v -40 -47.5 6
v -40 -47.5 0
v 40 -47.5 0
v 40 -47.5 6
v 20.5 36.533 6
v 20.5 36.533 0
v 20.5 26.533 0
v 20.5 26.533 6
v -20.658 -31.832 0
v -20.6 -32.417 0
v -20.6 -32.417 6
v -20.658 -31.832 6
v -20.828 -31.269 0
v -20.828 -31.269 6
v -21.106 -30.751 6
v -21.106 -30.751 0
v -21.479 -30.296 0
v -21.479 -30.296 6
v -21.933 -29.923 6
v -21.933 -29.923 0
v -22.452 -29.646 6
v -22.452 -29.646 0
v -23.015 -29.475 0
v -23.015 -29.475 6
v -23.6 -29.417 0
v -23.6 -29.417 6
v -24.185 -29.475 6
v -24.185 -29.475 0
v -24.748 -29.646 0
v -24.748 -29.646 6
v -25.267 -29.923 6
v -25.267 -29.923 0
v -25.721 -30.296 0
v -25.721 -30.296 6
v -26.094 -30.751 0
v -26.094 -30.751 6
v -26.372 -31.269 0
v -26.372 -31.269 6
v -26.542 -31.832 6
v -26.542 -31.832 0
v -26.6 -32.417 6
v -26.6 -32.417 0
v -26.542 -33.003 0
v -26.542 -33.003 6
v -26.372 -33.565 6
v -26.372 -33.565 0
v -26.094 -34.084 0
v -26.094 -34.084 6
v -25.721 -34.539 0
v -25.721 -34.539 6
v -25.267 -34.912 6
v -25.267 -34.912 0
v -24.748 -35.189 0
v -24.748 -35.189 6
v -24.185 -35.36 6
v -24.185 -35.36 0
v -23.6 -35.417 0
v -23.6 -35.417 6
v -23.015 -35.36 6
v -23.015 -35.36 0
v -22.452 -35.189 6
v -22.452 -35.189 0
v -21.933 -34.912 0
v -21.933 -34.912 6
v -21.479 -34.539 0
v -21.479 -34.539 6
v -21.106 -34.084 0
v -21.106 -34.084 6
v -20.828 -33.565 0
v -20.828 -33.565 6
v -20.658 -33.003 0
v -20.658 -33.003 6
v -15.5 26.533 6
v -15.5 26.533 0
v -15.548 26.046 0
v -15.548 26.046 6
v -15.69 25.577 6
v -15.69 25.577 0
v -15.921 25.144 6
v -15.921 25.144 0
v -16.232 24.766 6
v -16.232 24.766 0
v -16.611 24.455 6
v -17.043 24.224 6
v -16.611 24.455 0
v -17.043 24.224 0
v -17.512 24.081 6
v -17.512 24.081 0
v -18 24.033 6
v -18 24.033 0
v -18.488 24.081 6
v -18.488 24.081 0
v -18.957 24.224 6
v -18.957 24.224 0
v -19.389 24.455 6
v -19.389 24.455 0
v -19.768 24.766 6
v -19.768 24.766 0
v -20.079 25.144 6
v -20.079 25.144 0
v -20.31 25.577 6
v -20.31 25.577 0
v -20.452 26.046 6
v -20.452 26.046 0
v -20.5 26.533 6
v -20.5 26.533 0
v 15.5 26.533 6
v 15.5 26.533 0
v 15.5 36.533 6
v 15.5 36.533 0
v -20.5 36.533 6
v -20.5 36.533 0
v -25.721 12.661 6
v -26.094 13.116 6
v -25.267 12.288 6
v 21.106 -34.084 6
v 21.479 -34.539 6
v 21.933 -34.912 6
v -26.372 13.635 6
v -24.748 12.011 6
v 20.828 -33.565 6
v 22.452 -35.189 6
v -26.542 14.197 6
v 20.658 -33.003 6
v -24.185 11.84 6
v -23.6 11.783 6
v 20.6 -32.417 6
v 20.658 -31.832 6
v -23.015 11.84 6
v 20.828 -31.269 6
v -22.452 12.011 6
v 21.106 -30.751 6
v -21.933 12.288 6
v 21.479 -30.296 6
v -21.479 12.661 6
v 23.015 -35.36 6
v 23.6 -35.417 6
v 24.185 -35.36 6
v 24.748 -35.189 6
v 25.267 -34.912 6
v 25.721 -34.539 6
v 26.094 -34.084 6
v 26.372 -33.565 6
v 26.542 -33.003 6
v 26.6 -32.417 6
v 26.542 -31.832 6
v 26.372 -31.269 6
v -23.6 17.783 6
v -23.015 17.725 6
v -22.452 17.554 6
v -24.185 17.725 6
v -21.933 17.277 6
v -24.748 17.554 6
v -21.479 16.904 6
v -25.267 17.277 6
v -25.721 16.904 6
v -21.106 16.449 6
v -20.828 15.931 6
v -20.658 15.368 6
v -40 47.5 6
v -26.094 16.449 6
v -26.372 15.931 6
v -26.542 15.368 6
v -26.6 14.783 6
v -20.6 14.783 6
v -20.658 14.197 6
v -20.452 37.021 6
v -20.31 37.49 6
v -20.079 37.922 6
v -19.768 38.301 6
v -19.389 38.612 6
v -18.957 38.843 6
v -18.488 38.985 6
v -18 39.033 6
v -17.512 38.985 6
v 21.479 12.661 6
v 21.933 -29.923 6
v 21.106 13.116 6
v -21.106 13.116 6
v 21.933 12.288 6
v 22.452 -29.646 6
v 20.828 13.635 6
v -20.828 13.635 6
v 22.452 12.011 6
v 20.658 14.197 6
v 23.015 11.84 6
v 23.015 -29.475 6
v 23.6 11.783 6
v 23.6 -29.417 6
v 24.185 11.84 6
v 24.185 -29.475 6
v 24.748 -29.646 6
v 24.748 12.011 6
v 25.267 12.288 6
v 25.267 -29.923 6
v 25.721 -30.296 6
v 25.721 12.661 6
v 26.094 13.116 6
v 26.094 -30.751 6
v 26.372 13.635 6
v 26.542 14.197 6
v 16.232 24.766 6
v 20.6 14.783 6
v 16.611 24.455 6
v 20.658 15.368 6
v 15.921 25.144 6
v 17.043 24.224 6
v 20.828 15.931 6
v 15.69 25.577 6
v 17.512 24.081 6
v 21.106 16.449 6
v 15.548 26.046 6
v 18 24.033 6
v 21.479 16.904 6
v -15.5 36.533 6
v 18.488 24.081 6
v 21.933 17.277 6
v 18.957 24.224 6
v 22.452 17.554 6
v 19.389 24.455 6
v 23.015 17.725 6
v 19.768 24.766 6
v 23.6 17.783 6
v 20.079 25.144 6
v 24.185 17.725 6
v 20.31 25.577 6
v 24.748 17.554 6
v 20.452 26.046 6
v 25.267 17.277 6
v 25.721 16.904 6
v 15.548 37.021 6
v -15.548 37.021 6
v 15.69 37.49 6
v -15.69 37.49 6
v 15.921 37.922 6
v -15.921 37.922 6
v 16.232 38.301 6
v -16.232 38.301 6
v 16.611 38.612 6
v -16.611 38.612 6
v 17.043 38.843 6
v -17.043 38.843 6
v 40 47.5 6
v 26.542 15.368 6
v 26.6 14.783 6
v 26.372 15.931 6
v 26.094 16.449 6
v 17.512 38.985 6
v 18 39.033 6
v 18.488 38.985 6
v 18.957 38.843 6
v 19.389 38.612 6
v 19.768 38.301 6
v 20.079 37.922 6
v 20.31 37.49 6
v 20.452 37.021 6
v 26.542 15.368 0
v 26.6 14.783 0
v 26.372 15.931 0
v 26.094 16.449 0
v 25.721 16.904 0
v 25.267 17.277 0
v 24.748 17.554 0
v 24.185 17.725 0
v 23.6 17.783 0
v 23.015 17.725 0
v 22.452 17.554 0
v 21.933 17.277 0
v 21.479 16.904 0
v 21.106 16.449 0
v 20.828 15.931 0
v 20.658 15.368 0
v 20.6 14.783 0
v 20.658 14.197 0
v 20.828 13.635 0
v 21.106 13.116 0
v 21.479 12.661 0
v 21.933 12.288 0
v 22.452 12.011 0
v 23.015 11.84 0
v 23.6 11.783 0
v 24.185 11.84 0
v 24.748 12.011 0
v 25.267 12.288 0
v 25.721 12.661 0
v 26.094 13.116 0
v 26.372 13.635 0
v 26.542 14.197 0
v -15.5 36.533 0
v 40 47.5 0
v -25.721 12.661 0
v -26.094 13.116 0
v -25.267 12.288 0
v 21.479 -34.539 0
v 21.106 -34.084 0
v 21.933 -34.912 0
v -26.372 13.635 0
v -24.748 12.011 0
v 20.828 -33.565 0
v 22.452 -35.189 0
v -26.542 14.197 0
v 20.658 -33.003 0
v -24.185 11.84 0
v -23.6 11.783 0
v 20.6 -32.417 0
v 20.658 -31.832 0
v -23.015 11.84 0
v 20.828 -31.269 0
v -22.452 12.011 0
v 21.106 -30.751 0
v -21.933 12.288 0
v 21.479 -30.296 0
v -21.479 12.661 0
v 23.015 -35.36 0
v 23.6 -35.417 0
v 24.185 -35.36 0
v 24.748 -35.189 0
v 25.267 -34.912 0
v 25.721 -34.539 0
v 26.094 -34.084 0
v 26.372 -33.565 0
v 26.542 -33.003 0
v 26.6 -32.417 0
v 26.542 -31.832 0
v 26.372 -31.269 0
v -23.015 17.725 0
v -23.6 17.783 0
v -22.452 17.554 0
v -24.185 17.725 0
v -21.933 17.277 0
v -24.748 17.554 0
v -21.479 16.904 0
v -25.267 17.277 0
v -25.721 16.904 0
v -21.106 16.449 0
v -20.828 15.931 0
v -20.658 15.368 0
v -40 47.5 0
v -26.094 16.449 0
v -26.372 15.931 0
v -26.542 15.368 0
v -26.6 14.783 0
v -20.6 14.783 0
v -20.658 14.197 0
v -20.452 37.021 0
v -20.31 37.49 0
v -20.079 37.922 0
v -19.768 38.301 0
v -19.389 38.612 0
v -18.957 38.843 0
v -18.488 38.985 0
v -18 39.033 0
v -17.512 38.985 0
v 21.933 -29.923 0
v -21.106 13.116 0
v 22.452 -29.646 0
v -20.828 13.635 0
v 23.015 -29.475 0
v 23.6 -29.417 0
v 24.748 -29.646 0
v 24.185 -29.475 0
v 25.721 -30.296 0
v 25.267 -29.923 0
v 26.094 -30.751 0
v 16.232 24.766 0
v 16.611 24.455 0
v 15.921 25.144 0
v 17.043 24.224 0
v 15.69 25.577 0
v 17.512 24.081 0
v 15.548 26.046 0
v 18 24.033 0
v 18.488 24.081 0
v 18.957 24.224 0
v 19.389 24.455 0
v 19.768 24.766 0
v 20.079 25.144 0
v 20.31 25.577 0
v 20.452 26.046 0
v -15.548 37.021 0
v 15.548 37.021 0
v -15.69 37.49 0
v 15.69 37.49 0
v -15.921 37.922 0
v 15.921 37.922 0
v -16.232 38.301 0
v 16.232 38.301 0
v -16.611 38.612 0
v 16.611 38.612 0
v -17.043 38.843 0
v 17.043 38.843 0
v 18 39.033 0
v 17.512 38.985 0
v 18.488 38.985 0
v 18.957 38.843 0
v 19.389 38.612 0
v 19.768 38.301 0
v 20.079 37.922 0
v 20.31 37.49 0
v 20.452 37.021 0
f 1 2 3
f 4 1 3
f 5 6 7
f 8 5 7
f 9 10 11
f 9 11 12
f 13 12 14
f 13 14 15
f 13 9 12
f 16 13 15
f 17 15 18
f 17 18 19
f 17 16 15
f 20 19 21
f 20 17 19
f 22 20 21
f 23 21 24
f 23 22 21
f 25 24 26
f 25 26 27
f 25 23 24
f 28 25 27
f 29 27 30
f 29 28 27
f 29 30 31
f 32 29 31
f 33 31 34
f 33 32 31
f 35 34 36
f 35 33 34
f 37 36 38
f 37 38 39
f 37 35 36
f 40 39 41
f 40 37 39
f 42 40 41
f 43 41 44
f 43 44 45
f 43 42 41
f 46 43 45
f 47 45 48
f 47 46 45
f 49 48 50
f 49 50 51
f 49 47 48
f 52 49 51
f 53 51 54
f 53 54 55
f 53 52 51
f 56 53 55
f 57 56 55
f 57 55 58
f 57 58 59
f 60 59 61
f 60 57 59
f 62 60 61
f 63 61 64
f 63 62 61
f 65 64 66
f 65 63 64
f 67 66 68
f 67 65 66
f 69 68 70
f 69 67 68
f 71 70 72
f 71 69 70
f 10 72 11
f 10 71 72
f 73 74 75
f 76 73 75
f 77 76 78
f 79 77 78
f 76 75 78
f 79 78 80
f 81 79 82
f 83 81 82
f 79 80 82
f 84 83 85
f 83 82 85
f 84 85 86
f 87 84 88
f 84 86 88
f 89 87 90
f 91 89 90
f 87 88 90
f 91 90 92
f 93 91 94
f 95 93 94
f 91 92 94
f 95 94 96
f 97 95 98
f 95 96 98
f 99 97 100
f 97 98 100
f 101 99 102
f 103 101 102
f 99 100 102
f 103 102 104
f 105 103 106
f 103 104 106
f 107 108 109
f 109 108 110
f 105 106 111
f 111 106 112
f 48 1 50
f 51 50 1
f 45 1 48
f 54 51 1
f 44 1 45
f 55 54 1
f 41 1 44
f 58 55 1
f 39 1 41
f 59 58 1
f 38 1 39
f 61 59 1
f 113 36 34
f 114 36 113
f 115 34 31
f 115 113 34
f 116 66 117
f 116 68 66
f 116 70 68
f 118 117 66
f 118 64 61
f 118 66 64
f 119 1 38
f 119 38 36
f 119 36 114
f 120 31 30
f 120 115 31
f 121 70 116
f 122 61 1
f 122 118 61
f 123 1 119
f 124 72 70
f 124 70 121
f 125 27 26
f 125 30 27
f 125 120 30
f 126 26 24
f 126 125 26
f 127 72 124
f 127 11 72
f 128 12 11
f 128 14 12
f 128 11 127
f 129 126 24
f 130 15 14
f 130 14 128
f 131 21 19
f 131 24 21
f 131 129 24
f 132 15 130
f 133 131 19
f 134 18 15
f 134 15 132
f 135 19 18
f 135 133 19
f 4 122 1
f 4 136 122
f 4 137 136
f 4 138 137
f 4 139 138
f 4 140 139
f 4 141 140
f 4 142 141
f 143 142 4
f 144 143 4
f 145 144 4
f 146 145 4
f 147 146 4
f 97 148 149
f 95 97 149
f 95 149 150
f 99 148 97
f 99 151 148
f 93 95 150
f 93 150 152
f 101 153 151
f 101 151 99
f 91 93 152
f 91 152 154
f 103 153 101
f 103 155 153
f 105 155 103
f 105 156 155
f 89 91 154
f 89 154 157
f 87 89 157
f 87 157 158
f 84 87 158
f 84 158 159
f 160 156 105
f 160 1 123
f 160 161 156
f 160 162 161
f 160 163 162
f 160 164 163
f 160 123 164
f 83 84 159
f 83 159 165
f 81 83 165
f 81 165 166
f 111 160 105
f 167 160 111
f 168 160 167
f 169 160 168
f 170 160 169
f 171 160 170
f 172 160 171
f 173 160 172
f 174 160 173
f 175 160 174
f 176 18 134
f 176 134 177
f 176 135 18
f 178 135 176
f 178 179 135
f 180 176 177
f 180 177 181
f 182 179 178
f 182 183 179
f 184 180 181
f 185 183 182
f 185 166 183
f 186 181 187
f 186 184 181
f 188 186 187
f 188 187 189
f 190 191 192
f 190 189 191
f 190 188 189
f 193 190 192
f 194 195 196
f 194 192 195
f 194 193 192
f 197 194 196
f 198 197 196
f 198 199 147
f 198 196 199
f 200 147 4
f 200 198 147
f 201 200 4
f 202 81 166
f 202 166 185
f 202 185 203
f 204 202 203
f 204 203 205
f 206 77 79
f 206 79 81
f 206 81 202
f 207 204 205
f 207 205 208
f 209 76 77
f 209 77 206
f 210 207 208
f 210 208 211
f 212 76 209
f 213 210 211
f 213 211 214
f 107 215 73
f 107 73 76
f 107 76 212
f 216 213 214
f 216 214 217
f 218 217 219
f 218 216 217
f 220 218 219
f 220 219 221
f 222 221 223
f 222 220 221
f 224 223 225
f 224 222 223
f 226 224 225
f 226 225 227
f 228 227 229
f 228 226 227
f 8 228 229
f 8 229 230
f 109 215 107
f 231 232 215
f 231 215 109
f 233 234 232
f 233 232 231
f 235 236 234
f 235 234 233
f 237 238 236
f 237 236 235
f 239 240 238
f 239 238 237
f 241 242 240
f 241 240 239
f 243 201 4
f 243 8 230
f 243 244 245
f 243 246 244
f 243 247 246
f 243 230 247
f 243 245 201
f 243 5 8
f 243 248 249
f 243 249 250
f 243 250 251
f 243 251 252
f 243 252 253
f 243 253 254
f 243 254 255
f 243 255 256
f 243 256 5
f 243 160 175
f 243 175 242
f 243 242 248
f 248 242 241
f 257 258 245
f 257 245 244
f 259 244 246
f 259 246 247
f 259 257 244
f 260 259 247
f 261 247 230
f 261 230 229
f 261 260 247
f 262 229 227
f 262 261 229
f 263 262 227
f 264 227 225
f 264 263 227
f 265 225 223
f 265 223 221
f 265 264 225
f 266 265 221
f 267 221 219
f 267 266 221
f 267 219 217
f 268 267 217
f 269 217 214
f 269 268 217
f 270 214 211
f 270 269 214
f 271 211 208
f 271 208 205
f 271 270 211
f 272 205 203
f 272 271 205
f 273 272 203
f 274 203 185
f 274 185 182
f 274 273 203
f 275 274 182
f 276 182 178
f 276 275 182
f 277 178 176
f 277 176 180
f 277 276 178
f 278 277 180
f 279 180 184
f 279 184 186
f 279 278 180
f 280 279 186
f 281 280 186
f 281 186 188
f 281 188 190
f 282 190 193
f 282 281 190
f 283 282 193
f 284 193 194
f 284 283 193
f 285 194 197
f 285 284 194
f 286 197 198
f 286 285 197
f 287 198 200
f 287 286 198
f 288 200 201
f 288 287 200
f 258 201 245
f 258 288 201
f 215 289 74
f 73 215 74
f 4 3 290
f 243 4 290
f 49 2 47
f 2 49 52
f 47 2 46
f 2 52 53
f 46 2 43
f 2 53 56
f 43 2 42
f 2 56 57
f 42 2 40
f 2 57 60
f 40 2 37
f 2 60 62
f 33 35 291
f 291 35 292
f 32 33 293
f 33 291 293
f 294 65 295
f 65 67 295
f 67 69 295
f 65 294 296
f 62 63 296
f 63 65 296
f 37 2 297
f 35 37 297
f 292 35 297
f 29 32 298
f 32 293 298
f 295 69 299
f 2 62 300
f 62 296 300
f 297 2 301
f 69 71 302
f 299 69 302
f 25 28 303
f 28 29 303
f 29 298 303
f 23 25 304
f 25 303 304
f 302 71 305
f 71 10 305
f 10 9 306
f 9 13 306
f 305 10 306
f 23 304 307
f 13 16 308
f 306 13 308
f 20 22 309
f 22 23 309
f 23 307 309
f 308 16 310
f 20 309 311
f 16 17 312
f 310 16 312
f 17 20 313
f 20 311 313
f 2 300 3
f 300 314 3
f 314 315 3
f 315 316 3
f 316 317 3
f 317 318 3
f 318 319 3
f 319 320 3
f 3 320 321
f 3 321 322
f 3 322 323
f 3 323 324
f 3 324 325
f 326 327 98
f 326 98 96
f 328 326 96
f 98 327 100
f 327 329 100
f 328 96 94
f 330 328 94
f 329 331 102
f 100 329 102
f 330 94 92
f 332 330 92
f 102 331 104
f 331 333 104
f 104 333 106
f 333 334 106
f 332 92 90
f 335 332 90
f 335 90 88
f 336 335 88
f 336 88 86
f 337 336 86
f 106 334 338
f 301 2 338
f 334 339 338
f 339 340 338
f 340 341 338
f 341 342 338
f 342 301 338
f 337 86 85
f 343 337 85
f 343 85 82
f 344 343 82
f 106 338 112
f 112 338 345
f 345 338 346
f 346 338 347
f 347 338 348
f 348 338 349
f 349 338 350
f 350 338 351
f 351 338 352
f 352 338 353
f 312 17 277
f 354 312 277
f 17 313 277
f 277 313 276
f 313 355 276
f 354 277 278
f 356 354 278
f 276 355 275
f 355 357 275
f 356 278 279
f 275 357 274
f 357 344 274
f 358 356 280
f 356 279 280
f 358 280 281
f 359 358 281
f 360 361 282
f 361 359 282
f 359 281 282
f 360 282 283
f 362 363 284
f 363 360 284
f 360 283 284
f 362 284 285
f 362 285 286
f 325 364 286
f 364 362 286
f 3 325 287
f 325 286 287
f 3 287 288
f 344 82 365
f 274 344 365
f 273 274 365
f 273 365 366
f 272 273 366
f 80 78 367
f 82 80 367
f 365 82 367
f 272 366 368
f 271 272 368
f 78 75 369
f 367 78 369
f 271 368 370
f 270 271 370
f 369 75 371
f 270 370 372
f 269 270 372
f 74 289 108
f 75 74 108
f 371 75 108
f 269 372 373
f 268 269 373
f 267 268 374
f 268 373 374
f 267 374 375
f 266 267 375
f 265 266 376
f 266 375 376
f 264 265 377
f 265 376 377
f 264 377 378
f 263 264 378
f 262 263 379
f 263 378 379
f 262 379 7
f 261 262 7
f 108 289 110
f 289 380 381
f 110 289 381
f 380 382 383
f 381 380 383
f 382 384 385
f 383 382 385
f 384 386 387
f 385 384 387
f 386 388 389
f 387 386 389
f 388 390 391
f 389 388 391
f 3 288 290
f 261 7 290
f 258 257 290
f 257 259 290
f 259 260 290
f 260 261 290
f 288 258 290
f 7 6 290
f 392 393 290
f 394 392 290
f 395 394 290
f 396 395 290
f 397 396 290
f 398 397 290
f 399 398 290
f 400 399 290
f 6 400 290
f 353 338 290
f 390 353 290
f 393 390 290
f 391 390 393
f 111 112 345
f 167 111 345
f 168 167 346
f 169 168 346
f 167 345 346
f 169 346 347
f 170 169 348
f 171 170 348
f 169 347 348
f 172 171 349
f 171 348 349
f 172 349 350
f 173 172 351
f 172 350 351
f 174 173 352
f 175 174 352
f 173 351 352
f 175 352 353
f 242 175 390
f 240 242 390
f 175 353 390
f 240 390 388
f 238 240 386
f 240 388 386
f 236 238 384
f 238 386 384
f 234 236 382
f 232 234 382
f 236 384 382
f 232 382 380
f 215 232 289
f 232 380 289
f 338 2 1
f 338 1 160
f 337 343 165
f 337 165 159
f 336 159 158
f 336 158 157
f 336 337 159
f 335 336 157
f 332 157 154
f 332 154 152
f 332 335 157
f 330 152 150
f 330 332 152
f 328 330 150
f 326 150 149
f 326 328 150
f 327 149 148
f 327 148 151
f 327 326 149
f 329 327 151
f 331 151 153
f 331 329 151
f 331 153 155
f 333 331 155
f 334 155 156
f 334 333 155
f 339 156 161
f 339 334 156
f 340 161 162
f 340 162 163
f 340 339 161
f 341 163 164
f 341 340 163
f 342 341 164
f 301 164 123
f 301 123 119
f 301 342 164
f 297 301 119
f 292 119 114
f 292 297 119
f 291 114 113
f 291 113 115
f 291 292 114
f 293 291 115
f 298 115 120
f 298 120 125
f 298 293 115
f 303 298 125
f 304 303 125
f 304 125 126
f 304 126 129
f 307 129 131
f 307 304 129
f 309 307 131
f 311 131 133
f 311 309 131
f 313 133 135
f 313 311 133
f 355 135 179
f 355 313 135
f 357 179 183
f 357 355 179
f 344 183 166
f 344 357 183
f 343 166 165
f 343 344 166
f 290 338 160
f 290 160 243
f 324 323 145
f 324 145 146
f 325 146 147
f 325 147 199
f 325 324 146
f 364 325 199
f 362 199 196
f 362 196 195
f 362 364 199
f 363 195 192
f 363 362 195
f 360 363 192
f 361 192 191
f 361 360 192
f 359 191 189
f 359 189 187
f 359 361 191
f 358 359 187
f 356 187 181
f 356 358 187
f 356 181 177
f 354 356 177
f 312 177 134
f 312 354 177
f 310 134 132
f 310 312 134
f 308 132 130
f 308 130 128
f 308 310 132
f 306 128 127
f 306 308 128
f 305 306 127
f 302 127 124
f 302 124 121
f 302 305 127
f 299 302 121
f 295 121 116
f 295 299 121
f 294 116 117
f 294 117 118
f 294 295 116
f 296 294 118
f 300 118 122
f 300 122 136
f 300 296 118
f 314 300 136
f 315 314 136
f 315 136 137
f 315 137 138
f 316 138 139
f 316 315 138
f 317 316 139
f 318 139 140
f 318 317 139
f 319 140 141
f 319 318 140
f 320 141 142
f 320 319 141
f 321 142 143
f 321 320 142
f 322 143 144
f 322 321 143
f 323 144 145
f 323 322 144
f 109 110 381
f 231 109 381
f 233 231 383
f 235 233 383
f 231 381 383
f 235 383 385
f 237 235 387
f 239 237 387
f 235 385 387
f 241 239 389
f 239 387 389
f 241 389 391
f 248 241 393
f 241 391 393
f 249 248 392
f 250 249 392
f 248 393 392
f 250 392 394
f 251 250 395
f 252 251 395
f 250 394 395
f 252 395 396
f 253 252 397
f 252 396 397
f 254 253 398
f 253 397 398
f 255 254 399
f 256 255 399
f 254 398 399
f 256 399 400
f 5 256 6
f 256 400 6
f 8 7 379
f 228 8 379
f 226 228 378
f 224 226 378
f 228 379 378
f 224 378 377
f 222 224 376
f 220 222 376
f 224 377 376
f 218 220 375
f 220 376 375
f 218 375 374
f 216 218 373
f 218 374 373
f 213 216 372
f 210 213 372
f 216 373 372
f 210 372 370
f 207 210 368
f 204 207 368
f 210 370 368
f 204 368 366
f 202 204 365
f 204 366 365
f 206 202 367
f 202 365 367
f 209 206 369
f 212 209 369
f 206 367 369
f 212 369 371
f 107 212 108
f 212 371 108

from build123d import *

# Parameters (mm, degrees)
F0_W     = 80
F0_H     = 95
F0_R     = 3
F1_DEPTH = 6


with BuildPart() as f1:
    # F0 (on Top) → F1 (new body)
    with BuildSketch(Plane.XY):
        Rectangle(F0_W, F0_H)
        with Locations((-23.6, -32.417263)):
            Circle(F0_R, mode=Mode.SUBTRACT)
        with Locations((23.6, -32.417263)):
            Circle(F0_R, mode=Mode.SUBTRACT)
        with Locations((-23.6, 14.782737)):
            Circle(F0_R, mode=Mode.SUBTRACT)
        with BuildLine():
            ThreePointArc((-20.5, 36.533368), (-18, 39.033368), (-15.5, 36.533368))
            Line((-15.5, 36.533368), (-15.5, 26.533368))
            ThreePointArc((-15.5, 26.533368), (-18, 24.033368), (-20.5, 26.533368))
            Line((-20.5, 26.533368), (-20.5, 36.533368))
        make_face(mode=Mode.SUBTRACT)
        with Locations((23.6, 14.782737)):
            Circle(F0_R, mode=Mode.SUBTRACT)
        with BuildLine():
            ThreePointArc((20.5, 26.533368), (18, 24.033368), (15.5, 26.533368))
            Line((15.5, 26.533368), (15.5, 36.533368))
            ThreePointArc((15.5, 36.533368), (18, 39.033368), (20.5, 36.533368))
            Line((20.5, 36.533368), (20.5, 26.533368))
        make_face(mode=Mode.SUBTRACT)
    extrude(amount=F1_DEPTH)


solid = f1.part
